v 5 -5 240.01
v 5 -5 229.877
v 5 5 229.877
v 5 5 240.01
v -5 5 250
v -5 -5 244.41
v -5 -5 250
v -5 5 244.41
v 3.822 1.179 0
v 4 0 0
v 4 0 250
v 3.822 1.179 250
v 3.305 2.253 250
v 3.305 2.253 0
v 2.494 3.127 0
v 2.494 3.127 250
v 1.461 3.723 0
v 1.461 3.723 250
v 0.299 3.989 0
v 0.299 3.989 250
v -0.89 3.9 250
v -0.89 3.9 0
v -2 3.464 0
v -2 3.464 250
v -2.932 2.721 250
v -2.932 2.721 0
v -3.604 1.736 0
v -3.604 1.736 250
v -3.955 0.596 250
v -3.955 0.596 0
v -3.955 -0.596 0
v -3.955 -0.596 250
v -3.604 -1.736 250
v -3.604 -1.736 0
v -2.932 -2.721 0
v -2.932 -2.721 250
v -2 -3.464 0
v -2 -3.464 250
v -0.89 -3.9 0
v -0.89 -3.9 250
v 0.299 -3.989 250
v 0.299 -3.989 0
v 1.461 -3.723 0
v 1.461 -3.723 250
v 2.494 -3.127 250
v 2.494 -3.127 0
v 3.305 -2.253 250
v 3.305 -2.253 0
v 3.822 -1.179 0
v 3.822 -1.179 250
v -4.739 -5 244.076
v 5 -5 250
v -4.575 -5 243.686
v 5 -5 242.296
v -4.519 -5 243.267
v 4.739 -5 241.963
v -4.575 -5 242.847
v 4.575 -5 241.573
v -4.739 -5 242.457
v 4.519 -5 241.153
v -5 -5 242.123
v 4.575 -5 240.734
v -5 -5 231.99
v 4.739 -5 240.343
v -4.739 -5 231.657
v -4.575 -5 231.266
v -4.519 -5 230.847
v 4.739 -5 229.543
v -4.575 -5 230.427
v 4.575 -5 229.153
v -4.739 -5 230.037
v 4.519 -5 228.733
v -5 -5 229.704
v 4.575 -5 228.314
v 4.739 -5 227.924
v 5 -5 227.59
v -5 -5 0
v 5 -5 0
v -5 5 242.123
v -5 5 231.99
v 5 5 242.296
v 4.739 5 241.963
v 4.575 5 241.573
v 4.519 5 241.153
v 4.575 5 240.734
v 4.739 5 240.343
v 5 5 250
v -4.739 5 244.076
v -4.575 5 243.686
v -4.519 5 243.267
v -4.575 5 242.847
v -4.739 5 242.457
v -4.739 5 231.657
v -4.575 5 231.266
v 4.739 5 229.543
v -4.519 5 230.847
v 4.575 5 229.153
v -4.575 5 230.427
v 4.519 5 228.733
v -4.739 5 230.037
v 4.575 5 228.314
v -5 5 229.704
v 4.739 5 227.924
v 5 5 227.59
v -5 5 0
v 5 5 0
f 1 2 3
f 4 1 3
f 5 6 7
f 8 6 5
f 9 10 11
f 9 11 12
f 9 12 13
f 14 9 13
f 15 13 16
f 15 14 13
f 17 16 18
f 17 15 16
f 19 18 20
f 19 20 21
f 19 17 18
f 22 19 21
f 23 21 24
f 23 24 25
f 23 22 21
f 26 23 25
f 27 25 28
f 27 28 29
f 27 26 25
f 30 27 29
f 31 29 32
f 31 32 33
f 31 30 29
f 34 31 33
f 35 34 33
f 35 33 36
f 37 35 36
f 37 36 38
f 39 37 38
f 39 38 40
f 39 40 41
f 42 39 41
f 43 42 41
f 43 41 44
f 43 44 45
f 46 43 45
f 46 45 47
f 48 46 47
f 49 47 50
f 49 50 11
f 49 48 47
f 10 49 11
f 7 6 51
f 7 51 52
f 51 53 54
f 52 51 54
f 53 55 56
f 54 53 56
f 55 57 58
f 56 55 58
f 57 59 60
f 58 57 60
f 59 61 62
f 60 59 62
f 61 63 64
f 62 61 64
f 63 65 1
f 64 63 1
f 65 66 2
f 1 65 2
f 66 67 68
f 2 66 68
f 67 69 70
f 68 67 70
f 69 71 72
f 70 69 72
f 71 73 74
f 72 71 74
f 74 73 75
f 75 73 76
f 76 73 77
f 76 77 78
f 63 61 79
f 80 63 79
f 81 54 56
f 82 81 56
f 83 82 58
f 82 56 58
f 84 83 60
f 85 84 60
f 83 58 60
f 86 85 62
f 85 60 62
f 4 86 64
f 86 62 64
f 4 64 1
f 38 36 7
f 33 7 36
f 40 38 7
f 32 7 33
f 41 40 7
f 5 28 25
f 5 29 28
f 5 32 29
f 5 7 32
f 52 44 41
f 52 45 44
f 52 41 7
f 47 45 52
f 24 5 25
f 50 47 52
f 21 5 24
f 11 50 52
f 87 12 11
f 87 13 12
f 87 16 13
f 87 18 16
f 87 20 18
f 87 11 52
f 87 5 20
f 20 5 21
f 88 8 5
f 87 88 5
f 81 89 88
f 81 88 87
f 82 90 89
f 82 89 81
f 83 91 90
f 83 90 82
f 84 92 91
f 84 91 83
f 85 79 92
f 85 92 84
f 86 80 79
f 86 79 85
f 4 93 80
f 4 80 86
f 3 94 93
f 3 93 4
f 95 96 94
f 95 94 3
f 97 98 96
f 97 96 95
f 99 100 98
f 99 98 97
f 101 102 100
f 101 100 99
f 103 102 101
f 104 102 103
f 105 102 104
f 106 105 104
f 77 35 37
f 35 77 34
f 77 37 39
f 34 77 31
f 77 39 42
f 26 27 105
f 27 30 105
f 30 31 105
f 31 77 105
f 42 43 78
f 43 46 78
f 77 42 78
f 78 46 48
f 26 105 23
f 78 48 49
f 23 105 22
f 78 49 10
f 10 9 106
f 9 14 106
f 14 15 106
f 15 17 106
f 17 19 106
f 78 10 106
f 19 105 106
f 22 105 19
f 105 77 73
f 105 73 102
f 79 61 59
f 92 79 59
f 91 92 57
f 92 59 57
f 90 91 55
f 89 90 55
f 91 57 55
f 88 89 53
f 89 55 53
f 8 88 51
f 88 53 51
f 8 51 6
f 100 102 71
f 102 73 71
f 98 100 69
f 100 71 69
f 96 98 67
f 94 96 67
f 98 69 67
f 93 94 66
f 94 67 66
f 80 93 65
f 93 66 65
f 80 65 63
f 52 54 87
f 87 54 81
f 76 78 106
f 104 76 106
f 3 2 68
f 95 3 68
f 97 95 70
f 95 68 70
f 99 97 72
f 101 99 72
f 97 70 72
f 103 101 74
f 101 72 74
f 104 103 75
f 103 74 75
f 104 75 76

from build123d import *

# Parameters (mm, degrees)
SKETCH1_W           = 10
SKETCH1_H           = 10
SKETCH1_R           = 4
BOSS_EXTRUDE1_DEPTH = 250
SKETCH2_R           = 1.6
CUT_EXTRUDE1_DEPTH  = 11


with BuildPart() as part:
    # Sketch1 → Boss-Extrude1 (new body)
    with BuildSketch(Plane.XY):
        Rectangle(SKETCH1_W, SKETCH1_H)
        Circle(SKETCH1_R, mode=Mode.SUBTRACT)
    extrude(amount=BOSS_EXTRUDE1_DEPTH)

    # Sketch2 → Cut-Extrude1 (cut, through all)
    with BuildSketch(Plane.XZ.offset(5)):
        with Locations((-6.119289585, 243.266656382)):
            Circle(SKETCH2_R)
        with Locations((6.119289585, 228.733343618)):
            Circle(SKETCH2_R)
        with Locations((-6.119289585, 230.846914034)):
            Circle(SKETCH2_R)
        with Locations((6.119289585, 241.153085966)):
            Circle(SKETCH2_R)
    extrude(amount=-CUT_EXTRUDE1_DEPTH, mode=Mode.SUBTRACT)


solid = part.part
